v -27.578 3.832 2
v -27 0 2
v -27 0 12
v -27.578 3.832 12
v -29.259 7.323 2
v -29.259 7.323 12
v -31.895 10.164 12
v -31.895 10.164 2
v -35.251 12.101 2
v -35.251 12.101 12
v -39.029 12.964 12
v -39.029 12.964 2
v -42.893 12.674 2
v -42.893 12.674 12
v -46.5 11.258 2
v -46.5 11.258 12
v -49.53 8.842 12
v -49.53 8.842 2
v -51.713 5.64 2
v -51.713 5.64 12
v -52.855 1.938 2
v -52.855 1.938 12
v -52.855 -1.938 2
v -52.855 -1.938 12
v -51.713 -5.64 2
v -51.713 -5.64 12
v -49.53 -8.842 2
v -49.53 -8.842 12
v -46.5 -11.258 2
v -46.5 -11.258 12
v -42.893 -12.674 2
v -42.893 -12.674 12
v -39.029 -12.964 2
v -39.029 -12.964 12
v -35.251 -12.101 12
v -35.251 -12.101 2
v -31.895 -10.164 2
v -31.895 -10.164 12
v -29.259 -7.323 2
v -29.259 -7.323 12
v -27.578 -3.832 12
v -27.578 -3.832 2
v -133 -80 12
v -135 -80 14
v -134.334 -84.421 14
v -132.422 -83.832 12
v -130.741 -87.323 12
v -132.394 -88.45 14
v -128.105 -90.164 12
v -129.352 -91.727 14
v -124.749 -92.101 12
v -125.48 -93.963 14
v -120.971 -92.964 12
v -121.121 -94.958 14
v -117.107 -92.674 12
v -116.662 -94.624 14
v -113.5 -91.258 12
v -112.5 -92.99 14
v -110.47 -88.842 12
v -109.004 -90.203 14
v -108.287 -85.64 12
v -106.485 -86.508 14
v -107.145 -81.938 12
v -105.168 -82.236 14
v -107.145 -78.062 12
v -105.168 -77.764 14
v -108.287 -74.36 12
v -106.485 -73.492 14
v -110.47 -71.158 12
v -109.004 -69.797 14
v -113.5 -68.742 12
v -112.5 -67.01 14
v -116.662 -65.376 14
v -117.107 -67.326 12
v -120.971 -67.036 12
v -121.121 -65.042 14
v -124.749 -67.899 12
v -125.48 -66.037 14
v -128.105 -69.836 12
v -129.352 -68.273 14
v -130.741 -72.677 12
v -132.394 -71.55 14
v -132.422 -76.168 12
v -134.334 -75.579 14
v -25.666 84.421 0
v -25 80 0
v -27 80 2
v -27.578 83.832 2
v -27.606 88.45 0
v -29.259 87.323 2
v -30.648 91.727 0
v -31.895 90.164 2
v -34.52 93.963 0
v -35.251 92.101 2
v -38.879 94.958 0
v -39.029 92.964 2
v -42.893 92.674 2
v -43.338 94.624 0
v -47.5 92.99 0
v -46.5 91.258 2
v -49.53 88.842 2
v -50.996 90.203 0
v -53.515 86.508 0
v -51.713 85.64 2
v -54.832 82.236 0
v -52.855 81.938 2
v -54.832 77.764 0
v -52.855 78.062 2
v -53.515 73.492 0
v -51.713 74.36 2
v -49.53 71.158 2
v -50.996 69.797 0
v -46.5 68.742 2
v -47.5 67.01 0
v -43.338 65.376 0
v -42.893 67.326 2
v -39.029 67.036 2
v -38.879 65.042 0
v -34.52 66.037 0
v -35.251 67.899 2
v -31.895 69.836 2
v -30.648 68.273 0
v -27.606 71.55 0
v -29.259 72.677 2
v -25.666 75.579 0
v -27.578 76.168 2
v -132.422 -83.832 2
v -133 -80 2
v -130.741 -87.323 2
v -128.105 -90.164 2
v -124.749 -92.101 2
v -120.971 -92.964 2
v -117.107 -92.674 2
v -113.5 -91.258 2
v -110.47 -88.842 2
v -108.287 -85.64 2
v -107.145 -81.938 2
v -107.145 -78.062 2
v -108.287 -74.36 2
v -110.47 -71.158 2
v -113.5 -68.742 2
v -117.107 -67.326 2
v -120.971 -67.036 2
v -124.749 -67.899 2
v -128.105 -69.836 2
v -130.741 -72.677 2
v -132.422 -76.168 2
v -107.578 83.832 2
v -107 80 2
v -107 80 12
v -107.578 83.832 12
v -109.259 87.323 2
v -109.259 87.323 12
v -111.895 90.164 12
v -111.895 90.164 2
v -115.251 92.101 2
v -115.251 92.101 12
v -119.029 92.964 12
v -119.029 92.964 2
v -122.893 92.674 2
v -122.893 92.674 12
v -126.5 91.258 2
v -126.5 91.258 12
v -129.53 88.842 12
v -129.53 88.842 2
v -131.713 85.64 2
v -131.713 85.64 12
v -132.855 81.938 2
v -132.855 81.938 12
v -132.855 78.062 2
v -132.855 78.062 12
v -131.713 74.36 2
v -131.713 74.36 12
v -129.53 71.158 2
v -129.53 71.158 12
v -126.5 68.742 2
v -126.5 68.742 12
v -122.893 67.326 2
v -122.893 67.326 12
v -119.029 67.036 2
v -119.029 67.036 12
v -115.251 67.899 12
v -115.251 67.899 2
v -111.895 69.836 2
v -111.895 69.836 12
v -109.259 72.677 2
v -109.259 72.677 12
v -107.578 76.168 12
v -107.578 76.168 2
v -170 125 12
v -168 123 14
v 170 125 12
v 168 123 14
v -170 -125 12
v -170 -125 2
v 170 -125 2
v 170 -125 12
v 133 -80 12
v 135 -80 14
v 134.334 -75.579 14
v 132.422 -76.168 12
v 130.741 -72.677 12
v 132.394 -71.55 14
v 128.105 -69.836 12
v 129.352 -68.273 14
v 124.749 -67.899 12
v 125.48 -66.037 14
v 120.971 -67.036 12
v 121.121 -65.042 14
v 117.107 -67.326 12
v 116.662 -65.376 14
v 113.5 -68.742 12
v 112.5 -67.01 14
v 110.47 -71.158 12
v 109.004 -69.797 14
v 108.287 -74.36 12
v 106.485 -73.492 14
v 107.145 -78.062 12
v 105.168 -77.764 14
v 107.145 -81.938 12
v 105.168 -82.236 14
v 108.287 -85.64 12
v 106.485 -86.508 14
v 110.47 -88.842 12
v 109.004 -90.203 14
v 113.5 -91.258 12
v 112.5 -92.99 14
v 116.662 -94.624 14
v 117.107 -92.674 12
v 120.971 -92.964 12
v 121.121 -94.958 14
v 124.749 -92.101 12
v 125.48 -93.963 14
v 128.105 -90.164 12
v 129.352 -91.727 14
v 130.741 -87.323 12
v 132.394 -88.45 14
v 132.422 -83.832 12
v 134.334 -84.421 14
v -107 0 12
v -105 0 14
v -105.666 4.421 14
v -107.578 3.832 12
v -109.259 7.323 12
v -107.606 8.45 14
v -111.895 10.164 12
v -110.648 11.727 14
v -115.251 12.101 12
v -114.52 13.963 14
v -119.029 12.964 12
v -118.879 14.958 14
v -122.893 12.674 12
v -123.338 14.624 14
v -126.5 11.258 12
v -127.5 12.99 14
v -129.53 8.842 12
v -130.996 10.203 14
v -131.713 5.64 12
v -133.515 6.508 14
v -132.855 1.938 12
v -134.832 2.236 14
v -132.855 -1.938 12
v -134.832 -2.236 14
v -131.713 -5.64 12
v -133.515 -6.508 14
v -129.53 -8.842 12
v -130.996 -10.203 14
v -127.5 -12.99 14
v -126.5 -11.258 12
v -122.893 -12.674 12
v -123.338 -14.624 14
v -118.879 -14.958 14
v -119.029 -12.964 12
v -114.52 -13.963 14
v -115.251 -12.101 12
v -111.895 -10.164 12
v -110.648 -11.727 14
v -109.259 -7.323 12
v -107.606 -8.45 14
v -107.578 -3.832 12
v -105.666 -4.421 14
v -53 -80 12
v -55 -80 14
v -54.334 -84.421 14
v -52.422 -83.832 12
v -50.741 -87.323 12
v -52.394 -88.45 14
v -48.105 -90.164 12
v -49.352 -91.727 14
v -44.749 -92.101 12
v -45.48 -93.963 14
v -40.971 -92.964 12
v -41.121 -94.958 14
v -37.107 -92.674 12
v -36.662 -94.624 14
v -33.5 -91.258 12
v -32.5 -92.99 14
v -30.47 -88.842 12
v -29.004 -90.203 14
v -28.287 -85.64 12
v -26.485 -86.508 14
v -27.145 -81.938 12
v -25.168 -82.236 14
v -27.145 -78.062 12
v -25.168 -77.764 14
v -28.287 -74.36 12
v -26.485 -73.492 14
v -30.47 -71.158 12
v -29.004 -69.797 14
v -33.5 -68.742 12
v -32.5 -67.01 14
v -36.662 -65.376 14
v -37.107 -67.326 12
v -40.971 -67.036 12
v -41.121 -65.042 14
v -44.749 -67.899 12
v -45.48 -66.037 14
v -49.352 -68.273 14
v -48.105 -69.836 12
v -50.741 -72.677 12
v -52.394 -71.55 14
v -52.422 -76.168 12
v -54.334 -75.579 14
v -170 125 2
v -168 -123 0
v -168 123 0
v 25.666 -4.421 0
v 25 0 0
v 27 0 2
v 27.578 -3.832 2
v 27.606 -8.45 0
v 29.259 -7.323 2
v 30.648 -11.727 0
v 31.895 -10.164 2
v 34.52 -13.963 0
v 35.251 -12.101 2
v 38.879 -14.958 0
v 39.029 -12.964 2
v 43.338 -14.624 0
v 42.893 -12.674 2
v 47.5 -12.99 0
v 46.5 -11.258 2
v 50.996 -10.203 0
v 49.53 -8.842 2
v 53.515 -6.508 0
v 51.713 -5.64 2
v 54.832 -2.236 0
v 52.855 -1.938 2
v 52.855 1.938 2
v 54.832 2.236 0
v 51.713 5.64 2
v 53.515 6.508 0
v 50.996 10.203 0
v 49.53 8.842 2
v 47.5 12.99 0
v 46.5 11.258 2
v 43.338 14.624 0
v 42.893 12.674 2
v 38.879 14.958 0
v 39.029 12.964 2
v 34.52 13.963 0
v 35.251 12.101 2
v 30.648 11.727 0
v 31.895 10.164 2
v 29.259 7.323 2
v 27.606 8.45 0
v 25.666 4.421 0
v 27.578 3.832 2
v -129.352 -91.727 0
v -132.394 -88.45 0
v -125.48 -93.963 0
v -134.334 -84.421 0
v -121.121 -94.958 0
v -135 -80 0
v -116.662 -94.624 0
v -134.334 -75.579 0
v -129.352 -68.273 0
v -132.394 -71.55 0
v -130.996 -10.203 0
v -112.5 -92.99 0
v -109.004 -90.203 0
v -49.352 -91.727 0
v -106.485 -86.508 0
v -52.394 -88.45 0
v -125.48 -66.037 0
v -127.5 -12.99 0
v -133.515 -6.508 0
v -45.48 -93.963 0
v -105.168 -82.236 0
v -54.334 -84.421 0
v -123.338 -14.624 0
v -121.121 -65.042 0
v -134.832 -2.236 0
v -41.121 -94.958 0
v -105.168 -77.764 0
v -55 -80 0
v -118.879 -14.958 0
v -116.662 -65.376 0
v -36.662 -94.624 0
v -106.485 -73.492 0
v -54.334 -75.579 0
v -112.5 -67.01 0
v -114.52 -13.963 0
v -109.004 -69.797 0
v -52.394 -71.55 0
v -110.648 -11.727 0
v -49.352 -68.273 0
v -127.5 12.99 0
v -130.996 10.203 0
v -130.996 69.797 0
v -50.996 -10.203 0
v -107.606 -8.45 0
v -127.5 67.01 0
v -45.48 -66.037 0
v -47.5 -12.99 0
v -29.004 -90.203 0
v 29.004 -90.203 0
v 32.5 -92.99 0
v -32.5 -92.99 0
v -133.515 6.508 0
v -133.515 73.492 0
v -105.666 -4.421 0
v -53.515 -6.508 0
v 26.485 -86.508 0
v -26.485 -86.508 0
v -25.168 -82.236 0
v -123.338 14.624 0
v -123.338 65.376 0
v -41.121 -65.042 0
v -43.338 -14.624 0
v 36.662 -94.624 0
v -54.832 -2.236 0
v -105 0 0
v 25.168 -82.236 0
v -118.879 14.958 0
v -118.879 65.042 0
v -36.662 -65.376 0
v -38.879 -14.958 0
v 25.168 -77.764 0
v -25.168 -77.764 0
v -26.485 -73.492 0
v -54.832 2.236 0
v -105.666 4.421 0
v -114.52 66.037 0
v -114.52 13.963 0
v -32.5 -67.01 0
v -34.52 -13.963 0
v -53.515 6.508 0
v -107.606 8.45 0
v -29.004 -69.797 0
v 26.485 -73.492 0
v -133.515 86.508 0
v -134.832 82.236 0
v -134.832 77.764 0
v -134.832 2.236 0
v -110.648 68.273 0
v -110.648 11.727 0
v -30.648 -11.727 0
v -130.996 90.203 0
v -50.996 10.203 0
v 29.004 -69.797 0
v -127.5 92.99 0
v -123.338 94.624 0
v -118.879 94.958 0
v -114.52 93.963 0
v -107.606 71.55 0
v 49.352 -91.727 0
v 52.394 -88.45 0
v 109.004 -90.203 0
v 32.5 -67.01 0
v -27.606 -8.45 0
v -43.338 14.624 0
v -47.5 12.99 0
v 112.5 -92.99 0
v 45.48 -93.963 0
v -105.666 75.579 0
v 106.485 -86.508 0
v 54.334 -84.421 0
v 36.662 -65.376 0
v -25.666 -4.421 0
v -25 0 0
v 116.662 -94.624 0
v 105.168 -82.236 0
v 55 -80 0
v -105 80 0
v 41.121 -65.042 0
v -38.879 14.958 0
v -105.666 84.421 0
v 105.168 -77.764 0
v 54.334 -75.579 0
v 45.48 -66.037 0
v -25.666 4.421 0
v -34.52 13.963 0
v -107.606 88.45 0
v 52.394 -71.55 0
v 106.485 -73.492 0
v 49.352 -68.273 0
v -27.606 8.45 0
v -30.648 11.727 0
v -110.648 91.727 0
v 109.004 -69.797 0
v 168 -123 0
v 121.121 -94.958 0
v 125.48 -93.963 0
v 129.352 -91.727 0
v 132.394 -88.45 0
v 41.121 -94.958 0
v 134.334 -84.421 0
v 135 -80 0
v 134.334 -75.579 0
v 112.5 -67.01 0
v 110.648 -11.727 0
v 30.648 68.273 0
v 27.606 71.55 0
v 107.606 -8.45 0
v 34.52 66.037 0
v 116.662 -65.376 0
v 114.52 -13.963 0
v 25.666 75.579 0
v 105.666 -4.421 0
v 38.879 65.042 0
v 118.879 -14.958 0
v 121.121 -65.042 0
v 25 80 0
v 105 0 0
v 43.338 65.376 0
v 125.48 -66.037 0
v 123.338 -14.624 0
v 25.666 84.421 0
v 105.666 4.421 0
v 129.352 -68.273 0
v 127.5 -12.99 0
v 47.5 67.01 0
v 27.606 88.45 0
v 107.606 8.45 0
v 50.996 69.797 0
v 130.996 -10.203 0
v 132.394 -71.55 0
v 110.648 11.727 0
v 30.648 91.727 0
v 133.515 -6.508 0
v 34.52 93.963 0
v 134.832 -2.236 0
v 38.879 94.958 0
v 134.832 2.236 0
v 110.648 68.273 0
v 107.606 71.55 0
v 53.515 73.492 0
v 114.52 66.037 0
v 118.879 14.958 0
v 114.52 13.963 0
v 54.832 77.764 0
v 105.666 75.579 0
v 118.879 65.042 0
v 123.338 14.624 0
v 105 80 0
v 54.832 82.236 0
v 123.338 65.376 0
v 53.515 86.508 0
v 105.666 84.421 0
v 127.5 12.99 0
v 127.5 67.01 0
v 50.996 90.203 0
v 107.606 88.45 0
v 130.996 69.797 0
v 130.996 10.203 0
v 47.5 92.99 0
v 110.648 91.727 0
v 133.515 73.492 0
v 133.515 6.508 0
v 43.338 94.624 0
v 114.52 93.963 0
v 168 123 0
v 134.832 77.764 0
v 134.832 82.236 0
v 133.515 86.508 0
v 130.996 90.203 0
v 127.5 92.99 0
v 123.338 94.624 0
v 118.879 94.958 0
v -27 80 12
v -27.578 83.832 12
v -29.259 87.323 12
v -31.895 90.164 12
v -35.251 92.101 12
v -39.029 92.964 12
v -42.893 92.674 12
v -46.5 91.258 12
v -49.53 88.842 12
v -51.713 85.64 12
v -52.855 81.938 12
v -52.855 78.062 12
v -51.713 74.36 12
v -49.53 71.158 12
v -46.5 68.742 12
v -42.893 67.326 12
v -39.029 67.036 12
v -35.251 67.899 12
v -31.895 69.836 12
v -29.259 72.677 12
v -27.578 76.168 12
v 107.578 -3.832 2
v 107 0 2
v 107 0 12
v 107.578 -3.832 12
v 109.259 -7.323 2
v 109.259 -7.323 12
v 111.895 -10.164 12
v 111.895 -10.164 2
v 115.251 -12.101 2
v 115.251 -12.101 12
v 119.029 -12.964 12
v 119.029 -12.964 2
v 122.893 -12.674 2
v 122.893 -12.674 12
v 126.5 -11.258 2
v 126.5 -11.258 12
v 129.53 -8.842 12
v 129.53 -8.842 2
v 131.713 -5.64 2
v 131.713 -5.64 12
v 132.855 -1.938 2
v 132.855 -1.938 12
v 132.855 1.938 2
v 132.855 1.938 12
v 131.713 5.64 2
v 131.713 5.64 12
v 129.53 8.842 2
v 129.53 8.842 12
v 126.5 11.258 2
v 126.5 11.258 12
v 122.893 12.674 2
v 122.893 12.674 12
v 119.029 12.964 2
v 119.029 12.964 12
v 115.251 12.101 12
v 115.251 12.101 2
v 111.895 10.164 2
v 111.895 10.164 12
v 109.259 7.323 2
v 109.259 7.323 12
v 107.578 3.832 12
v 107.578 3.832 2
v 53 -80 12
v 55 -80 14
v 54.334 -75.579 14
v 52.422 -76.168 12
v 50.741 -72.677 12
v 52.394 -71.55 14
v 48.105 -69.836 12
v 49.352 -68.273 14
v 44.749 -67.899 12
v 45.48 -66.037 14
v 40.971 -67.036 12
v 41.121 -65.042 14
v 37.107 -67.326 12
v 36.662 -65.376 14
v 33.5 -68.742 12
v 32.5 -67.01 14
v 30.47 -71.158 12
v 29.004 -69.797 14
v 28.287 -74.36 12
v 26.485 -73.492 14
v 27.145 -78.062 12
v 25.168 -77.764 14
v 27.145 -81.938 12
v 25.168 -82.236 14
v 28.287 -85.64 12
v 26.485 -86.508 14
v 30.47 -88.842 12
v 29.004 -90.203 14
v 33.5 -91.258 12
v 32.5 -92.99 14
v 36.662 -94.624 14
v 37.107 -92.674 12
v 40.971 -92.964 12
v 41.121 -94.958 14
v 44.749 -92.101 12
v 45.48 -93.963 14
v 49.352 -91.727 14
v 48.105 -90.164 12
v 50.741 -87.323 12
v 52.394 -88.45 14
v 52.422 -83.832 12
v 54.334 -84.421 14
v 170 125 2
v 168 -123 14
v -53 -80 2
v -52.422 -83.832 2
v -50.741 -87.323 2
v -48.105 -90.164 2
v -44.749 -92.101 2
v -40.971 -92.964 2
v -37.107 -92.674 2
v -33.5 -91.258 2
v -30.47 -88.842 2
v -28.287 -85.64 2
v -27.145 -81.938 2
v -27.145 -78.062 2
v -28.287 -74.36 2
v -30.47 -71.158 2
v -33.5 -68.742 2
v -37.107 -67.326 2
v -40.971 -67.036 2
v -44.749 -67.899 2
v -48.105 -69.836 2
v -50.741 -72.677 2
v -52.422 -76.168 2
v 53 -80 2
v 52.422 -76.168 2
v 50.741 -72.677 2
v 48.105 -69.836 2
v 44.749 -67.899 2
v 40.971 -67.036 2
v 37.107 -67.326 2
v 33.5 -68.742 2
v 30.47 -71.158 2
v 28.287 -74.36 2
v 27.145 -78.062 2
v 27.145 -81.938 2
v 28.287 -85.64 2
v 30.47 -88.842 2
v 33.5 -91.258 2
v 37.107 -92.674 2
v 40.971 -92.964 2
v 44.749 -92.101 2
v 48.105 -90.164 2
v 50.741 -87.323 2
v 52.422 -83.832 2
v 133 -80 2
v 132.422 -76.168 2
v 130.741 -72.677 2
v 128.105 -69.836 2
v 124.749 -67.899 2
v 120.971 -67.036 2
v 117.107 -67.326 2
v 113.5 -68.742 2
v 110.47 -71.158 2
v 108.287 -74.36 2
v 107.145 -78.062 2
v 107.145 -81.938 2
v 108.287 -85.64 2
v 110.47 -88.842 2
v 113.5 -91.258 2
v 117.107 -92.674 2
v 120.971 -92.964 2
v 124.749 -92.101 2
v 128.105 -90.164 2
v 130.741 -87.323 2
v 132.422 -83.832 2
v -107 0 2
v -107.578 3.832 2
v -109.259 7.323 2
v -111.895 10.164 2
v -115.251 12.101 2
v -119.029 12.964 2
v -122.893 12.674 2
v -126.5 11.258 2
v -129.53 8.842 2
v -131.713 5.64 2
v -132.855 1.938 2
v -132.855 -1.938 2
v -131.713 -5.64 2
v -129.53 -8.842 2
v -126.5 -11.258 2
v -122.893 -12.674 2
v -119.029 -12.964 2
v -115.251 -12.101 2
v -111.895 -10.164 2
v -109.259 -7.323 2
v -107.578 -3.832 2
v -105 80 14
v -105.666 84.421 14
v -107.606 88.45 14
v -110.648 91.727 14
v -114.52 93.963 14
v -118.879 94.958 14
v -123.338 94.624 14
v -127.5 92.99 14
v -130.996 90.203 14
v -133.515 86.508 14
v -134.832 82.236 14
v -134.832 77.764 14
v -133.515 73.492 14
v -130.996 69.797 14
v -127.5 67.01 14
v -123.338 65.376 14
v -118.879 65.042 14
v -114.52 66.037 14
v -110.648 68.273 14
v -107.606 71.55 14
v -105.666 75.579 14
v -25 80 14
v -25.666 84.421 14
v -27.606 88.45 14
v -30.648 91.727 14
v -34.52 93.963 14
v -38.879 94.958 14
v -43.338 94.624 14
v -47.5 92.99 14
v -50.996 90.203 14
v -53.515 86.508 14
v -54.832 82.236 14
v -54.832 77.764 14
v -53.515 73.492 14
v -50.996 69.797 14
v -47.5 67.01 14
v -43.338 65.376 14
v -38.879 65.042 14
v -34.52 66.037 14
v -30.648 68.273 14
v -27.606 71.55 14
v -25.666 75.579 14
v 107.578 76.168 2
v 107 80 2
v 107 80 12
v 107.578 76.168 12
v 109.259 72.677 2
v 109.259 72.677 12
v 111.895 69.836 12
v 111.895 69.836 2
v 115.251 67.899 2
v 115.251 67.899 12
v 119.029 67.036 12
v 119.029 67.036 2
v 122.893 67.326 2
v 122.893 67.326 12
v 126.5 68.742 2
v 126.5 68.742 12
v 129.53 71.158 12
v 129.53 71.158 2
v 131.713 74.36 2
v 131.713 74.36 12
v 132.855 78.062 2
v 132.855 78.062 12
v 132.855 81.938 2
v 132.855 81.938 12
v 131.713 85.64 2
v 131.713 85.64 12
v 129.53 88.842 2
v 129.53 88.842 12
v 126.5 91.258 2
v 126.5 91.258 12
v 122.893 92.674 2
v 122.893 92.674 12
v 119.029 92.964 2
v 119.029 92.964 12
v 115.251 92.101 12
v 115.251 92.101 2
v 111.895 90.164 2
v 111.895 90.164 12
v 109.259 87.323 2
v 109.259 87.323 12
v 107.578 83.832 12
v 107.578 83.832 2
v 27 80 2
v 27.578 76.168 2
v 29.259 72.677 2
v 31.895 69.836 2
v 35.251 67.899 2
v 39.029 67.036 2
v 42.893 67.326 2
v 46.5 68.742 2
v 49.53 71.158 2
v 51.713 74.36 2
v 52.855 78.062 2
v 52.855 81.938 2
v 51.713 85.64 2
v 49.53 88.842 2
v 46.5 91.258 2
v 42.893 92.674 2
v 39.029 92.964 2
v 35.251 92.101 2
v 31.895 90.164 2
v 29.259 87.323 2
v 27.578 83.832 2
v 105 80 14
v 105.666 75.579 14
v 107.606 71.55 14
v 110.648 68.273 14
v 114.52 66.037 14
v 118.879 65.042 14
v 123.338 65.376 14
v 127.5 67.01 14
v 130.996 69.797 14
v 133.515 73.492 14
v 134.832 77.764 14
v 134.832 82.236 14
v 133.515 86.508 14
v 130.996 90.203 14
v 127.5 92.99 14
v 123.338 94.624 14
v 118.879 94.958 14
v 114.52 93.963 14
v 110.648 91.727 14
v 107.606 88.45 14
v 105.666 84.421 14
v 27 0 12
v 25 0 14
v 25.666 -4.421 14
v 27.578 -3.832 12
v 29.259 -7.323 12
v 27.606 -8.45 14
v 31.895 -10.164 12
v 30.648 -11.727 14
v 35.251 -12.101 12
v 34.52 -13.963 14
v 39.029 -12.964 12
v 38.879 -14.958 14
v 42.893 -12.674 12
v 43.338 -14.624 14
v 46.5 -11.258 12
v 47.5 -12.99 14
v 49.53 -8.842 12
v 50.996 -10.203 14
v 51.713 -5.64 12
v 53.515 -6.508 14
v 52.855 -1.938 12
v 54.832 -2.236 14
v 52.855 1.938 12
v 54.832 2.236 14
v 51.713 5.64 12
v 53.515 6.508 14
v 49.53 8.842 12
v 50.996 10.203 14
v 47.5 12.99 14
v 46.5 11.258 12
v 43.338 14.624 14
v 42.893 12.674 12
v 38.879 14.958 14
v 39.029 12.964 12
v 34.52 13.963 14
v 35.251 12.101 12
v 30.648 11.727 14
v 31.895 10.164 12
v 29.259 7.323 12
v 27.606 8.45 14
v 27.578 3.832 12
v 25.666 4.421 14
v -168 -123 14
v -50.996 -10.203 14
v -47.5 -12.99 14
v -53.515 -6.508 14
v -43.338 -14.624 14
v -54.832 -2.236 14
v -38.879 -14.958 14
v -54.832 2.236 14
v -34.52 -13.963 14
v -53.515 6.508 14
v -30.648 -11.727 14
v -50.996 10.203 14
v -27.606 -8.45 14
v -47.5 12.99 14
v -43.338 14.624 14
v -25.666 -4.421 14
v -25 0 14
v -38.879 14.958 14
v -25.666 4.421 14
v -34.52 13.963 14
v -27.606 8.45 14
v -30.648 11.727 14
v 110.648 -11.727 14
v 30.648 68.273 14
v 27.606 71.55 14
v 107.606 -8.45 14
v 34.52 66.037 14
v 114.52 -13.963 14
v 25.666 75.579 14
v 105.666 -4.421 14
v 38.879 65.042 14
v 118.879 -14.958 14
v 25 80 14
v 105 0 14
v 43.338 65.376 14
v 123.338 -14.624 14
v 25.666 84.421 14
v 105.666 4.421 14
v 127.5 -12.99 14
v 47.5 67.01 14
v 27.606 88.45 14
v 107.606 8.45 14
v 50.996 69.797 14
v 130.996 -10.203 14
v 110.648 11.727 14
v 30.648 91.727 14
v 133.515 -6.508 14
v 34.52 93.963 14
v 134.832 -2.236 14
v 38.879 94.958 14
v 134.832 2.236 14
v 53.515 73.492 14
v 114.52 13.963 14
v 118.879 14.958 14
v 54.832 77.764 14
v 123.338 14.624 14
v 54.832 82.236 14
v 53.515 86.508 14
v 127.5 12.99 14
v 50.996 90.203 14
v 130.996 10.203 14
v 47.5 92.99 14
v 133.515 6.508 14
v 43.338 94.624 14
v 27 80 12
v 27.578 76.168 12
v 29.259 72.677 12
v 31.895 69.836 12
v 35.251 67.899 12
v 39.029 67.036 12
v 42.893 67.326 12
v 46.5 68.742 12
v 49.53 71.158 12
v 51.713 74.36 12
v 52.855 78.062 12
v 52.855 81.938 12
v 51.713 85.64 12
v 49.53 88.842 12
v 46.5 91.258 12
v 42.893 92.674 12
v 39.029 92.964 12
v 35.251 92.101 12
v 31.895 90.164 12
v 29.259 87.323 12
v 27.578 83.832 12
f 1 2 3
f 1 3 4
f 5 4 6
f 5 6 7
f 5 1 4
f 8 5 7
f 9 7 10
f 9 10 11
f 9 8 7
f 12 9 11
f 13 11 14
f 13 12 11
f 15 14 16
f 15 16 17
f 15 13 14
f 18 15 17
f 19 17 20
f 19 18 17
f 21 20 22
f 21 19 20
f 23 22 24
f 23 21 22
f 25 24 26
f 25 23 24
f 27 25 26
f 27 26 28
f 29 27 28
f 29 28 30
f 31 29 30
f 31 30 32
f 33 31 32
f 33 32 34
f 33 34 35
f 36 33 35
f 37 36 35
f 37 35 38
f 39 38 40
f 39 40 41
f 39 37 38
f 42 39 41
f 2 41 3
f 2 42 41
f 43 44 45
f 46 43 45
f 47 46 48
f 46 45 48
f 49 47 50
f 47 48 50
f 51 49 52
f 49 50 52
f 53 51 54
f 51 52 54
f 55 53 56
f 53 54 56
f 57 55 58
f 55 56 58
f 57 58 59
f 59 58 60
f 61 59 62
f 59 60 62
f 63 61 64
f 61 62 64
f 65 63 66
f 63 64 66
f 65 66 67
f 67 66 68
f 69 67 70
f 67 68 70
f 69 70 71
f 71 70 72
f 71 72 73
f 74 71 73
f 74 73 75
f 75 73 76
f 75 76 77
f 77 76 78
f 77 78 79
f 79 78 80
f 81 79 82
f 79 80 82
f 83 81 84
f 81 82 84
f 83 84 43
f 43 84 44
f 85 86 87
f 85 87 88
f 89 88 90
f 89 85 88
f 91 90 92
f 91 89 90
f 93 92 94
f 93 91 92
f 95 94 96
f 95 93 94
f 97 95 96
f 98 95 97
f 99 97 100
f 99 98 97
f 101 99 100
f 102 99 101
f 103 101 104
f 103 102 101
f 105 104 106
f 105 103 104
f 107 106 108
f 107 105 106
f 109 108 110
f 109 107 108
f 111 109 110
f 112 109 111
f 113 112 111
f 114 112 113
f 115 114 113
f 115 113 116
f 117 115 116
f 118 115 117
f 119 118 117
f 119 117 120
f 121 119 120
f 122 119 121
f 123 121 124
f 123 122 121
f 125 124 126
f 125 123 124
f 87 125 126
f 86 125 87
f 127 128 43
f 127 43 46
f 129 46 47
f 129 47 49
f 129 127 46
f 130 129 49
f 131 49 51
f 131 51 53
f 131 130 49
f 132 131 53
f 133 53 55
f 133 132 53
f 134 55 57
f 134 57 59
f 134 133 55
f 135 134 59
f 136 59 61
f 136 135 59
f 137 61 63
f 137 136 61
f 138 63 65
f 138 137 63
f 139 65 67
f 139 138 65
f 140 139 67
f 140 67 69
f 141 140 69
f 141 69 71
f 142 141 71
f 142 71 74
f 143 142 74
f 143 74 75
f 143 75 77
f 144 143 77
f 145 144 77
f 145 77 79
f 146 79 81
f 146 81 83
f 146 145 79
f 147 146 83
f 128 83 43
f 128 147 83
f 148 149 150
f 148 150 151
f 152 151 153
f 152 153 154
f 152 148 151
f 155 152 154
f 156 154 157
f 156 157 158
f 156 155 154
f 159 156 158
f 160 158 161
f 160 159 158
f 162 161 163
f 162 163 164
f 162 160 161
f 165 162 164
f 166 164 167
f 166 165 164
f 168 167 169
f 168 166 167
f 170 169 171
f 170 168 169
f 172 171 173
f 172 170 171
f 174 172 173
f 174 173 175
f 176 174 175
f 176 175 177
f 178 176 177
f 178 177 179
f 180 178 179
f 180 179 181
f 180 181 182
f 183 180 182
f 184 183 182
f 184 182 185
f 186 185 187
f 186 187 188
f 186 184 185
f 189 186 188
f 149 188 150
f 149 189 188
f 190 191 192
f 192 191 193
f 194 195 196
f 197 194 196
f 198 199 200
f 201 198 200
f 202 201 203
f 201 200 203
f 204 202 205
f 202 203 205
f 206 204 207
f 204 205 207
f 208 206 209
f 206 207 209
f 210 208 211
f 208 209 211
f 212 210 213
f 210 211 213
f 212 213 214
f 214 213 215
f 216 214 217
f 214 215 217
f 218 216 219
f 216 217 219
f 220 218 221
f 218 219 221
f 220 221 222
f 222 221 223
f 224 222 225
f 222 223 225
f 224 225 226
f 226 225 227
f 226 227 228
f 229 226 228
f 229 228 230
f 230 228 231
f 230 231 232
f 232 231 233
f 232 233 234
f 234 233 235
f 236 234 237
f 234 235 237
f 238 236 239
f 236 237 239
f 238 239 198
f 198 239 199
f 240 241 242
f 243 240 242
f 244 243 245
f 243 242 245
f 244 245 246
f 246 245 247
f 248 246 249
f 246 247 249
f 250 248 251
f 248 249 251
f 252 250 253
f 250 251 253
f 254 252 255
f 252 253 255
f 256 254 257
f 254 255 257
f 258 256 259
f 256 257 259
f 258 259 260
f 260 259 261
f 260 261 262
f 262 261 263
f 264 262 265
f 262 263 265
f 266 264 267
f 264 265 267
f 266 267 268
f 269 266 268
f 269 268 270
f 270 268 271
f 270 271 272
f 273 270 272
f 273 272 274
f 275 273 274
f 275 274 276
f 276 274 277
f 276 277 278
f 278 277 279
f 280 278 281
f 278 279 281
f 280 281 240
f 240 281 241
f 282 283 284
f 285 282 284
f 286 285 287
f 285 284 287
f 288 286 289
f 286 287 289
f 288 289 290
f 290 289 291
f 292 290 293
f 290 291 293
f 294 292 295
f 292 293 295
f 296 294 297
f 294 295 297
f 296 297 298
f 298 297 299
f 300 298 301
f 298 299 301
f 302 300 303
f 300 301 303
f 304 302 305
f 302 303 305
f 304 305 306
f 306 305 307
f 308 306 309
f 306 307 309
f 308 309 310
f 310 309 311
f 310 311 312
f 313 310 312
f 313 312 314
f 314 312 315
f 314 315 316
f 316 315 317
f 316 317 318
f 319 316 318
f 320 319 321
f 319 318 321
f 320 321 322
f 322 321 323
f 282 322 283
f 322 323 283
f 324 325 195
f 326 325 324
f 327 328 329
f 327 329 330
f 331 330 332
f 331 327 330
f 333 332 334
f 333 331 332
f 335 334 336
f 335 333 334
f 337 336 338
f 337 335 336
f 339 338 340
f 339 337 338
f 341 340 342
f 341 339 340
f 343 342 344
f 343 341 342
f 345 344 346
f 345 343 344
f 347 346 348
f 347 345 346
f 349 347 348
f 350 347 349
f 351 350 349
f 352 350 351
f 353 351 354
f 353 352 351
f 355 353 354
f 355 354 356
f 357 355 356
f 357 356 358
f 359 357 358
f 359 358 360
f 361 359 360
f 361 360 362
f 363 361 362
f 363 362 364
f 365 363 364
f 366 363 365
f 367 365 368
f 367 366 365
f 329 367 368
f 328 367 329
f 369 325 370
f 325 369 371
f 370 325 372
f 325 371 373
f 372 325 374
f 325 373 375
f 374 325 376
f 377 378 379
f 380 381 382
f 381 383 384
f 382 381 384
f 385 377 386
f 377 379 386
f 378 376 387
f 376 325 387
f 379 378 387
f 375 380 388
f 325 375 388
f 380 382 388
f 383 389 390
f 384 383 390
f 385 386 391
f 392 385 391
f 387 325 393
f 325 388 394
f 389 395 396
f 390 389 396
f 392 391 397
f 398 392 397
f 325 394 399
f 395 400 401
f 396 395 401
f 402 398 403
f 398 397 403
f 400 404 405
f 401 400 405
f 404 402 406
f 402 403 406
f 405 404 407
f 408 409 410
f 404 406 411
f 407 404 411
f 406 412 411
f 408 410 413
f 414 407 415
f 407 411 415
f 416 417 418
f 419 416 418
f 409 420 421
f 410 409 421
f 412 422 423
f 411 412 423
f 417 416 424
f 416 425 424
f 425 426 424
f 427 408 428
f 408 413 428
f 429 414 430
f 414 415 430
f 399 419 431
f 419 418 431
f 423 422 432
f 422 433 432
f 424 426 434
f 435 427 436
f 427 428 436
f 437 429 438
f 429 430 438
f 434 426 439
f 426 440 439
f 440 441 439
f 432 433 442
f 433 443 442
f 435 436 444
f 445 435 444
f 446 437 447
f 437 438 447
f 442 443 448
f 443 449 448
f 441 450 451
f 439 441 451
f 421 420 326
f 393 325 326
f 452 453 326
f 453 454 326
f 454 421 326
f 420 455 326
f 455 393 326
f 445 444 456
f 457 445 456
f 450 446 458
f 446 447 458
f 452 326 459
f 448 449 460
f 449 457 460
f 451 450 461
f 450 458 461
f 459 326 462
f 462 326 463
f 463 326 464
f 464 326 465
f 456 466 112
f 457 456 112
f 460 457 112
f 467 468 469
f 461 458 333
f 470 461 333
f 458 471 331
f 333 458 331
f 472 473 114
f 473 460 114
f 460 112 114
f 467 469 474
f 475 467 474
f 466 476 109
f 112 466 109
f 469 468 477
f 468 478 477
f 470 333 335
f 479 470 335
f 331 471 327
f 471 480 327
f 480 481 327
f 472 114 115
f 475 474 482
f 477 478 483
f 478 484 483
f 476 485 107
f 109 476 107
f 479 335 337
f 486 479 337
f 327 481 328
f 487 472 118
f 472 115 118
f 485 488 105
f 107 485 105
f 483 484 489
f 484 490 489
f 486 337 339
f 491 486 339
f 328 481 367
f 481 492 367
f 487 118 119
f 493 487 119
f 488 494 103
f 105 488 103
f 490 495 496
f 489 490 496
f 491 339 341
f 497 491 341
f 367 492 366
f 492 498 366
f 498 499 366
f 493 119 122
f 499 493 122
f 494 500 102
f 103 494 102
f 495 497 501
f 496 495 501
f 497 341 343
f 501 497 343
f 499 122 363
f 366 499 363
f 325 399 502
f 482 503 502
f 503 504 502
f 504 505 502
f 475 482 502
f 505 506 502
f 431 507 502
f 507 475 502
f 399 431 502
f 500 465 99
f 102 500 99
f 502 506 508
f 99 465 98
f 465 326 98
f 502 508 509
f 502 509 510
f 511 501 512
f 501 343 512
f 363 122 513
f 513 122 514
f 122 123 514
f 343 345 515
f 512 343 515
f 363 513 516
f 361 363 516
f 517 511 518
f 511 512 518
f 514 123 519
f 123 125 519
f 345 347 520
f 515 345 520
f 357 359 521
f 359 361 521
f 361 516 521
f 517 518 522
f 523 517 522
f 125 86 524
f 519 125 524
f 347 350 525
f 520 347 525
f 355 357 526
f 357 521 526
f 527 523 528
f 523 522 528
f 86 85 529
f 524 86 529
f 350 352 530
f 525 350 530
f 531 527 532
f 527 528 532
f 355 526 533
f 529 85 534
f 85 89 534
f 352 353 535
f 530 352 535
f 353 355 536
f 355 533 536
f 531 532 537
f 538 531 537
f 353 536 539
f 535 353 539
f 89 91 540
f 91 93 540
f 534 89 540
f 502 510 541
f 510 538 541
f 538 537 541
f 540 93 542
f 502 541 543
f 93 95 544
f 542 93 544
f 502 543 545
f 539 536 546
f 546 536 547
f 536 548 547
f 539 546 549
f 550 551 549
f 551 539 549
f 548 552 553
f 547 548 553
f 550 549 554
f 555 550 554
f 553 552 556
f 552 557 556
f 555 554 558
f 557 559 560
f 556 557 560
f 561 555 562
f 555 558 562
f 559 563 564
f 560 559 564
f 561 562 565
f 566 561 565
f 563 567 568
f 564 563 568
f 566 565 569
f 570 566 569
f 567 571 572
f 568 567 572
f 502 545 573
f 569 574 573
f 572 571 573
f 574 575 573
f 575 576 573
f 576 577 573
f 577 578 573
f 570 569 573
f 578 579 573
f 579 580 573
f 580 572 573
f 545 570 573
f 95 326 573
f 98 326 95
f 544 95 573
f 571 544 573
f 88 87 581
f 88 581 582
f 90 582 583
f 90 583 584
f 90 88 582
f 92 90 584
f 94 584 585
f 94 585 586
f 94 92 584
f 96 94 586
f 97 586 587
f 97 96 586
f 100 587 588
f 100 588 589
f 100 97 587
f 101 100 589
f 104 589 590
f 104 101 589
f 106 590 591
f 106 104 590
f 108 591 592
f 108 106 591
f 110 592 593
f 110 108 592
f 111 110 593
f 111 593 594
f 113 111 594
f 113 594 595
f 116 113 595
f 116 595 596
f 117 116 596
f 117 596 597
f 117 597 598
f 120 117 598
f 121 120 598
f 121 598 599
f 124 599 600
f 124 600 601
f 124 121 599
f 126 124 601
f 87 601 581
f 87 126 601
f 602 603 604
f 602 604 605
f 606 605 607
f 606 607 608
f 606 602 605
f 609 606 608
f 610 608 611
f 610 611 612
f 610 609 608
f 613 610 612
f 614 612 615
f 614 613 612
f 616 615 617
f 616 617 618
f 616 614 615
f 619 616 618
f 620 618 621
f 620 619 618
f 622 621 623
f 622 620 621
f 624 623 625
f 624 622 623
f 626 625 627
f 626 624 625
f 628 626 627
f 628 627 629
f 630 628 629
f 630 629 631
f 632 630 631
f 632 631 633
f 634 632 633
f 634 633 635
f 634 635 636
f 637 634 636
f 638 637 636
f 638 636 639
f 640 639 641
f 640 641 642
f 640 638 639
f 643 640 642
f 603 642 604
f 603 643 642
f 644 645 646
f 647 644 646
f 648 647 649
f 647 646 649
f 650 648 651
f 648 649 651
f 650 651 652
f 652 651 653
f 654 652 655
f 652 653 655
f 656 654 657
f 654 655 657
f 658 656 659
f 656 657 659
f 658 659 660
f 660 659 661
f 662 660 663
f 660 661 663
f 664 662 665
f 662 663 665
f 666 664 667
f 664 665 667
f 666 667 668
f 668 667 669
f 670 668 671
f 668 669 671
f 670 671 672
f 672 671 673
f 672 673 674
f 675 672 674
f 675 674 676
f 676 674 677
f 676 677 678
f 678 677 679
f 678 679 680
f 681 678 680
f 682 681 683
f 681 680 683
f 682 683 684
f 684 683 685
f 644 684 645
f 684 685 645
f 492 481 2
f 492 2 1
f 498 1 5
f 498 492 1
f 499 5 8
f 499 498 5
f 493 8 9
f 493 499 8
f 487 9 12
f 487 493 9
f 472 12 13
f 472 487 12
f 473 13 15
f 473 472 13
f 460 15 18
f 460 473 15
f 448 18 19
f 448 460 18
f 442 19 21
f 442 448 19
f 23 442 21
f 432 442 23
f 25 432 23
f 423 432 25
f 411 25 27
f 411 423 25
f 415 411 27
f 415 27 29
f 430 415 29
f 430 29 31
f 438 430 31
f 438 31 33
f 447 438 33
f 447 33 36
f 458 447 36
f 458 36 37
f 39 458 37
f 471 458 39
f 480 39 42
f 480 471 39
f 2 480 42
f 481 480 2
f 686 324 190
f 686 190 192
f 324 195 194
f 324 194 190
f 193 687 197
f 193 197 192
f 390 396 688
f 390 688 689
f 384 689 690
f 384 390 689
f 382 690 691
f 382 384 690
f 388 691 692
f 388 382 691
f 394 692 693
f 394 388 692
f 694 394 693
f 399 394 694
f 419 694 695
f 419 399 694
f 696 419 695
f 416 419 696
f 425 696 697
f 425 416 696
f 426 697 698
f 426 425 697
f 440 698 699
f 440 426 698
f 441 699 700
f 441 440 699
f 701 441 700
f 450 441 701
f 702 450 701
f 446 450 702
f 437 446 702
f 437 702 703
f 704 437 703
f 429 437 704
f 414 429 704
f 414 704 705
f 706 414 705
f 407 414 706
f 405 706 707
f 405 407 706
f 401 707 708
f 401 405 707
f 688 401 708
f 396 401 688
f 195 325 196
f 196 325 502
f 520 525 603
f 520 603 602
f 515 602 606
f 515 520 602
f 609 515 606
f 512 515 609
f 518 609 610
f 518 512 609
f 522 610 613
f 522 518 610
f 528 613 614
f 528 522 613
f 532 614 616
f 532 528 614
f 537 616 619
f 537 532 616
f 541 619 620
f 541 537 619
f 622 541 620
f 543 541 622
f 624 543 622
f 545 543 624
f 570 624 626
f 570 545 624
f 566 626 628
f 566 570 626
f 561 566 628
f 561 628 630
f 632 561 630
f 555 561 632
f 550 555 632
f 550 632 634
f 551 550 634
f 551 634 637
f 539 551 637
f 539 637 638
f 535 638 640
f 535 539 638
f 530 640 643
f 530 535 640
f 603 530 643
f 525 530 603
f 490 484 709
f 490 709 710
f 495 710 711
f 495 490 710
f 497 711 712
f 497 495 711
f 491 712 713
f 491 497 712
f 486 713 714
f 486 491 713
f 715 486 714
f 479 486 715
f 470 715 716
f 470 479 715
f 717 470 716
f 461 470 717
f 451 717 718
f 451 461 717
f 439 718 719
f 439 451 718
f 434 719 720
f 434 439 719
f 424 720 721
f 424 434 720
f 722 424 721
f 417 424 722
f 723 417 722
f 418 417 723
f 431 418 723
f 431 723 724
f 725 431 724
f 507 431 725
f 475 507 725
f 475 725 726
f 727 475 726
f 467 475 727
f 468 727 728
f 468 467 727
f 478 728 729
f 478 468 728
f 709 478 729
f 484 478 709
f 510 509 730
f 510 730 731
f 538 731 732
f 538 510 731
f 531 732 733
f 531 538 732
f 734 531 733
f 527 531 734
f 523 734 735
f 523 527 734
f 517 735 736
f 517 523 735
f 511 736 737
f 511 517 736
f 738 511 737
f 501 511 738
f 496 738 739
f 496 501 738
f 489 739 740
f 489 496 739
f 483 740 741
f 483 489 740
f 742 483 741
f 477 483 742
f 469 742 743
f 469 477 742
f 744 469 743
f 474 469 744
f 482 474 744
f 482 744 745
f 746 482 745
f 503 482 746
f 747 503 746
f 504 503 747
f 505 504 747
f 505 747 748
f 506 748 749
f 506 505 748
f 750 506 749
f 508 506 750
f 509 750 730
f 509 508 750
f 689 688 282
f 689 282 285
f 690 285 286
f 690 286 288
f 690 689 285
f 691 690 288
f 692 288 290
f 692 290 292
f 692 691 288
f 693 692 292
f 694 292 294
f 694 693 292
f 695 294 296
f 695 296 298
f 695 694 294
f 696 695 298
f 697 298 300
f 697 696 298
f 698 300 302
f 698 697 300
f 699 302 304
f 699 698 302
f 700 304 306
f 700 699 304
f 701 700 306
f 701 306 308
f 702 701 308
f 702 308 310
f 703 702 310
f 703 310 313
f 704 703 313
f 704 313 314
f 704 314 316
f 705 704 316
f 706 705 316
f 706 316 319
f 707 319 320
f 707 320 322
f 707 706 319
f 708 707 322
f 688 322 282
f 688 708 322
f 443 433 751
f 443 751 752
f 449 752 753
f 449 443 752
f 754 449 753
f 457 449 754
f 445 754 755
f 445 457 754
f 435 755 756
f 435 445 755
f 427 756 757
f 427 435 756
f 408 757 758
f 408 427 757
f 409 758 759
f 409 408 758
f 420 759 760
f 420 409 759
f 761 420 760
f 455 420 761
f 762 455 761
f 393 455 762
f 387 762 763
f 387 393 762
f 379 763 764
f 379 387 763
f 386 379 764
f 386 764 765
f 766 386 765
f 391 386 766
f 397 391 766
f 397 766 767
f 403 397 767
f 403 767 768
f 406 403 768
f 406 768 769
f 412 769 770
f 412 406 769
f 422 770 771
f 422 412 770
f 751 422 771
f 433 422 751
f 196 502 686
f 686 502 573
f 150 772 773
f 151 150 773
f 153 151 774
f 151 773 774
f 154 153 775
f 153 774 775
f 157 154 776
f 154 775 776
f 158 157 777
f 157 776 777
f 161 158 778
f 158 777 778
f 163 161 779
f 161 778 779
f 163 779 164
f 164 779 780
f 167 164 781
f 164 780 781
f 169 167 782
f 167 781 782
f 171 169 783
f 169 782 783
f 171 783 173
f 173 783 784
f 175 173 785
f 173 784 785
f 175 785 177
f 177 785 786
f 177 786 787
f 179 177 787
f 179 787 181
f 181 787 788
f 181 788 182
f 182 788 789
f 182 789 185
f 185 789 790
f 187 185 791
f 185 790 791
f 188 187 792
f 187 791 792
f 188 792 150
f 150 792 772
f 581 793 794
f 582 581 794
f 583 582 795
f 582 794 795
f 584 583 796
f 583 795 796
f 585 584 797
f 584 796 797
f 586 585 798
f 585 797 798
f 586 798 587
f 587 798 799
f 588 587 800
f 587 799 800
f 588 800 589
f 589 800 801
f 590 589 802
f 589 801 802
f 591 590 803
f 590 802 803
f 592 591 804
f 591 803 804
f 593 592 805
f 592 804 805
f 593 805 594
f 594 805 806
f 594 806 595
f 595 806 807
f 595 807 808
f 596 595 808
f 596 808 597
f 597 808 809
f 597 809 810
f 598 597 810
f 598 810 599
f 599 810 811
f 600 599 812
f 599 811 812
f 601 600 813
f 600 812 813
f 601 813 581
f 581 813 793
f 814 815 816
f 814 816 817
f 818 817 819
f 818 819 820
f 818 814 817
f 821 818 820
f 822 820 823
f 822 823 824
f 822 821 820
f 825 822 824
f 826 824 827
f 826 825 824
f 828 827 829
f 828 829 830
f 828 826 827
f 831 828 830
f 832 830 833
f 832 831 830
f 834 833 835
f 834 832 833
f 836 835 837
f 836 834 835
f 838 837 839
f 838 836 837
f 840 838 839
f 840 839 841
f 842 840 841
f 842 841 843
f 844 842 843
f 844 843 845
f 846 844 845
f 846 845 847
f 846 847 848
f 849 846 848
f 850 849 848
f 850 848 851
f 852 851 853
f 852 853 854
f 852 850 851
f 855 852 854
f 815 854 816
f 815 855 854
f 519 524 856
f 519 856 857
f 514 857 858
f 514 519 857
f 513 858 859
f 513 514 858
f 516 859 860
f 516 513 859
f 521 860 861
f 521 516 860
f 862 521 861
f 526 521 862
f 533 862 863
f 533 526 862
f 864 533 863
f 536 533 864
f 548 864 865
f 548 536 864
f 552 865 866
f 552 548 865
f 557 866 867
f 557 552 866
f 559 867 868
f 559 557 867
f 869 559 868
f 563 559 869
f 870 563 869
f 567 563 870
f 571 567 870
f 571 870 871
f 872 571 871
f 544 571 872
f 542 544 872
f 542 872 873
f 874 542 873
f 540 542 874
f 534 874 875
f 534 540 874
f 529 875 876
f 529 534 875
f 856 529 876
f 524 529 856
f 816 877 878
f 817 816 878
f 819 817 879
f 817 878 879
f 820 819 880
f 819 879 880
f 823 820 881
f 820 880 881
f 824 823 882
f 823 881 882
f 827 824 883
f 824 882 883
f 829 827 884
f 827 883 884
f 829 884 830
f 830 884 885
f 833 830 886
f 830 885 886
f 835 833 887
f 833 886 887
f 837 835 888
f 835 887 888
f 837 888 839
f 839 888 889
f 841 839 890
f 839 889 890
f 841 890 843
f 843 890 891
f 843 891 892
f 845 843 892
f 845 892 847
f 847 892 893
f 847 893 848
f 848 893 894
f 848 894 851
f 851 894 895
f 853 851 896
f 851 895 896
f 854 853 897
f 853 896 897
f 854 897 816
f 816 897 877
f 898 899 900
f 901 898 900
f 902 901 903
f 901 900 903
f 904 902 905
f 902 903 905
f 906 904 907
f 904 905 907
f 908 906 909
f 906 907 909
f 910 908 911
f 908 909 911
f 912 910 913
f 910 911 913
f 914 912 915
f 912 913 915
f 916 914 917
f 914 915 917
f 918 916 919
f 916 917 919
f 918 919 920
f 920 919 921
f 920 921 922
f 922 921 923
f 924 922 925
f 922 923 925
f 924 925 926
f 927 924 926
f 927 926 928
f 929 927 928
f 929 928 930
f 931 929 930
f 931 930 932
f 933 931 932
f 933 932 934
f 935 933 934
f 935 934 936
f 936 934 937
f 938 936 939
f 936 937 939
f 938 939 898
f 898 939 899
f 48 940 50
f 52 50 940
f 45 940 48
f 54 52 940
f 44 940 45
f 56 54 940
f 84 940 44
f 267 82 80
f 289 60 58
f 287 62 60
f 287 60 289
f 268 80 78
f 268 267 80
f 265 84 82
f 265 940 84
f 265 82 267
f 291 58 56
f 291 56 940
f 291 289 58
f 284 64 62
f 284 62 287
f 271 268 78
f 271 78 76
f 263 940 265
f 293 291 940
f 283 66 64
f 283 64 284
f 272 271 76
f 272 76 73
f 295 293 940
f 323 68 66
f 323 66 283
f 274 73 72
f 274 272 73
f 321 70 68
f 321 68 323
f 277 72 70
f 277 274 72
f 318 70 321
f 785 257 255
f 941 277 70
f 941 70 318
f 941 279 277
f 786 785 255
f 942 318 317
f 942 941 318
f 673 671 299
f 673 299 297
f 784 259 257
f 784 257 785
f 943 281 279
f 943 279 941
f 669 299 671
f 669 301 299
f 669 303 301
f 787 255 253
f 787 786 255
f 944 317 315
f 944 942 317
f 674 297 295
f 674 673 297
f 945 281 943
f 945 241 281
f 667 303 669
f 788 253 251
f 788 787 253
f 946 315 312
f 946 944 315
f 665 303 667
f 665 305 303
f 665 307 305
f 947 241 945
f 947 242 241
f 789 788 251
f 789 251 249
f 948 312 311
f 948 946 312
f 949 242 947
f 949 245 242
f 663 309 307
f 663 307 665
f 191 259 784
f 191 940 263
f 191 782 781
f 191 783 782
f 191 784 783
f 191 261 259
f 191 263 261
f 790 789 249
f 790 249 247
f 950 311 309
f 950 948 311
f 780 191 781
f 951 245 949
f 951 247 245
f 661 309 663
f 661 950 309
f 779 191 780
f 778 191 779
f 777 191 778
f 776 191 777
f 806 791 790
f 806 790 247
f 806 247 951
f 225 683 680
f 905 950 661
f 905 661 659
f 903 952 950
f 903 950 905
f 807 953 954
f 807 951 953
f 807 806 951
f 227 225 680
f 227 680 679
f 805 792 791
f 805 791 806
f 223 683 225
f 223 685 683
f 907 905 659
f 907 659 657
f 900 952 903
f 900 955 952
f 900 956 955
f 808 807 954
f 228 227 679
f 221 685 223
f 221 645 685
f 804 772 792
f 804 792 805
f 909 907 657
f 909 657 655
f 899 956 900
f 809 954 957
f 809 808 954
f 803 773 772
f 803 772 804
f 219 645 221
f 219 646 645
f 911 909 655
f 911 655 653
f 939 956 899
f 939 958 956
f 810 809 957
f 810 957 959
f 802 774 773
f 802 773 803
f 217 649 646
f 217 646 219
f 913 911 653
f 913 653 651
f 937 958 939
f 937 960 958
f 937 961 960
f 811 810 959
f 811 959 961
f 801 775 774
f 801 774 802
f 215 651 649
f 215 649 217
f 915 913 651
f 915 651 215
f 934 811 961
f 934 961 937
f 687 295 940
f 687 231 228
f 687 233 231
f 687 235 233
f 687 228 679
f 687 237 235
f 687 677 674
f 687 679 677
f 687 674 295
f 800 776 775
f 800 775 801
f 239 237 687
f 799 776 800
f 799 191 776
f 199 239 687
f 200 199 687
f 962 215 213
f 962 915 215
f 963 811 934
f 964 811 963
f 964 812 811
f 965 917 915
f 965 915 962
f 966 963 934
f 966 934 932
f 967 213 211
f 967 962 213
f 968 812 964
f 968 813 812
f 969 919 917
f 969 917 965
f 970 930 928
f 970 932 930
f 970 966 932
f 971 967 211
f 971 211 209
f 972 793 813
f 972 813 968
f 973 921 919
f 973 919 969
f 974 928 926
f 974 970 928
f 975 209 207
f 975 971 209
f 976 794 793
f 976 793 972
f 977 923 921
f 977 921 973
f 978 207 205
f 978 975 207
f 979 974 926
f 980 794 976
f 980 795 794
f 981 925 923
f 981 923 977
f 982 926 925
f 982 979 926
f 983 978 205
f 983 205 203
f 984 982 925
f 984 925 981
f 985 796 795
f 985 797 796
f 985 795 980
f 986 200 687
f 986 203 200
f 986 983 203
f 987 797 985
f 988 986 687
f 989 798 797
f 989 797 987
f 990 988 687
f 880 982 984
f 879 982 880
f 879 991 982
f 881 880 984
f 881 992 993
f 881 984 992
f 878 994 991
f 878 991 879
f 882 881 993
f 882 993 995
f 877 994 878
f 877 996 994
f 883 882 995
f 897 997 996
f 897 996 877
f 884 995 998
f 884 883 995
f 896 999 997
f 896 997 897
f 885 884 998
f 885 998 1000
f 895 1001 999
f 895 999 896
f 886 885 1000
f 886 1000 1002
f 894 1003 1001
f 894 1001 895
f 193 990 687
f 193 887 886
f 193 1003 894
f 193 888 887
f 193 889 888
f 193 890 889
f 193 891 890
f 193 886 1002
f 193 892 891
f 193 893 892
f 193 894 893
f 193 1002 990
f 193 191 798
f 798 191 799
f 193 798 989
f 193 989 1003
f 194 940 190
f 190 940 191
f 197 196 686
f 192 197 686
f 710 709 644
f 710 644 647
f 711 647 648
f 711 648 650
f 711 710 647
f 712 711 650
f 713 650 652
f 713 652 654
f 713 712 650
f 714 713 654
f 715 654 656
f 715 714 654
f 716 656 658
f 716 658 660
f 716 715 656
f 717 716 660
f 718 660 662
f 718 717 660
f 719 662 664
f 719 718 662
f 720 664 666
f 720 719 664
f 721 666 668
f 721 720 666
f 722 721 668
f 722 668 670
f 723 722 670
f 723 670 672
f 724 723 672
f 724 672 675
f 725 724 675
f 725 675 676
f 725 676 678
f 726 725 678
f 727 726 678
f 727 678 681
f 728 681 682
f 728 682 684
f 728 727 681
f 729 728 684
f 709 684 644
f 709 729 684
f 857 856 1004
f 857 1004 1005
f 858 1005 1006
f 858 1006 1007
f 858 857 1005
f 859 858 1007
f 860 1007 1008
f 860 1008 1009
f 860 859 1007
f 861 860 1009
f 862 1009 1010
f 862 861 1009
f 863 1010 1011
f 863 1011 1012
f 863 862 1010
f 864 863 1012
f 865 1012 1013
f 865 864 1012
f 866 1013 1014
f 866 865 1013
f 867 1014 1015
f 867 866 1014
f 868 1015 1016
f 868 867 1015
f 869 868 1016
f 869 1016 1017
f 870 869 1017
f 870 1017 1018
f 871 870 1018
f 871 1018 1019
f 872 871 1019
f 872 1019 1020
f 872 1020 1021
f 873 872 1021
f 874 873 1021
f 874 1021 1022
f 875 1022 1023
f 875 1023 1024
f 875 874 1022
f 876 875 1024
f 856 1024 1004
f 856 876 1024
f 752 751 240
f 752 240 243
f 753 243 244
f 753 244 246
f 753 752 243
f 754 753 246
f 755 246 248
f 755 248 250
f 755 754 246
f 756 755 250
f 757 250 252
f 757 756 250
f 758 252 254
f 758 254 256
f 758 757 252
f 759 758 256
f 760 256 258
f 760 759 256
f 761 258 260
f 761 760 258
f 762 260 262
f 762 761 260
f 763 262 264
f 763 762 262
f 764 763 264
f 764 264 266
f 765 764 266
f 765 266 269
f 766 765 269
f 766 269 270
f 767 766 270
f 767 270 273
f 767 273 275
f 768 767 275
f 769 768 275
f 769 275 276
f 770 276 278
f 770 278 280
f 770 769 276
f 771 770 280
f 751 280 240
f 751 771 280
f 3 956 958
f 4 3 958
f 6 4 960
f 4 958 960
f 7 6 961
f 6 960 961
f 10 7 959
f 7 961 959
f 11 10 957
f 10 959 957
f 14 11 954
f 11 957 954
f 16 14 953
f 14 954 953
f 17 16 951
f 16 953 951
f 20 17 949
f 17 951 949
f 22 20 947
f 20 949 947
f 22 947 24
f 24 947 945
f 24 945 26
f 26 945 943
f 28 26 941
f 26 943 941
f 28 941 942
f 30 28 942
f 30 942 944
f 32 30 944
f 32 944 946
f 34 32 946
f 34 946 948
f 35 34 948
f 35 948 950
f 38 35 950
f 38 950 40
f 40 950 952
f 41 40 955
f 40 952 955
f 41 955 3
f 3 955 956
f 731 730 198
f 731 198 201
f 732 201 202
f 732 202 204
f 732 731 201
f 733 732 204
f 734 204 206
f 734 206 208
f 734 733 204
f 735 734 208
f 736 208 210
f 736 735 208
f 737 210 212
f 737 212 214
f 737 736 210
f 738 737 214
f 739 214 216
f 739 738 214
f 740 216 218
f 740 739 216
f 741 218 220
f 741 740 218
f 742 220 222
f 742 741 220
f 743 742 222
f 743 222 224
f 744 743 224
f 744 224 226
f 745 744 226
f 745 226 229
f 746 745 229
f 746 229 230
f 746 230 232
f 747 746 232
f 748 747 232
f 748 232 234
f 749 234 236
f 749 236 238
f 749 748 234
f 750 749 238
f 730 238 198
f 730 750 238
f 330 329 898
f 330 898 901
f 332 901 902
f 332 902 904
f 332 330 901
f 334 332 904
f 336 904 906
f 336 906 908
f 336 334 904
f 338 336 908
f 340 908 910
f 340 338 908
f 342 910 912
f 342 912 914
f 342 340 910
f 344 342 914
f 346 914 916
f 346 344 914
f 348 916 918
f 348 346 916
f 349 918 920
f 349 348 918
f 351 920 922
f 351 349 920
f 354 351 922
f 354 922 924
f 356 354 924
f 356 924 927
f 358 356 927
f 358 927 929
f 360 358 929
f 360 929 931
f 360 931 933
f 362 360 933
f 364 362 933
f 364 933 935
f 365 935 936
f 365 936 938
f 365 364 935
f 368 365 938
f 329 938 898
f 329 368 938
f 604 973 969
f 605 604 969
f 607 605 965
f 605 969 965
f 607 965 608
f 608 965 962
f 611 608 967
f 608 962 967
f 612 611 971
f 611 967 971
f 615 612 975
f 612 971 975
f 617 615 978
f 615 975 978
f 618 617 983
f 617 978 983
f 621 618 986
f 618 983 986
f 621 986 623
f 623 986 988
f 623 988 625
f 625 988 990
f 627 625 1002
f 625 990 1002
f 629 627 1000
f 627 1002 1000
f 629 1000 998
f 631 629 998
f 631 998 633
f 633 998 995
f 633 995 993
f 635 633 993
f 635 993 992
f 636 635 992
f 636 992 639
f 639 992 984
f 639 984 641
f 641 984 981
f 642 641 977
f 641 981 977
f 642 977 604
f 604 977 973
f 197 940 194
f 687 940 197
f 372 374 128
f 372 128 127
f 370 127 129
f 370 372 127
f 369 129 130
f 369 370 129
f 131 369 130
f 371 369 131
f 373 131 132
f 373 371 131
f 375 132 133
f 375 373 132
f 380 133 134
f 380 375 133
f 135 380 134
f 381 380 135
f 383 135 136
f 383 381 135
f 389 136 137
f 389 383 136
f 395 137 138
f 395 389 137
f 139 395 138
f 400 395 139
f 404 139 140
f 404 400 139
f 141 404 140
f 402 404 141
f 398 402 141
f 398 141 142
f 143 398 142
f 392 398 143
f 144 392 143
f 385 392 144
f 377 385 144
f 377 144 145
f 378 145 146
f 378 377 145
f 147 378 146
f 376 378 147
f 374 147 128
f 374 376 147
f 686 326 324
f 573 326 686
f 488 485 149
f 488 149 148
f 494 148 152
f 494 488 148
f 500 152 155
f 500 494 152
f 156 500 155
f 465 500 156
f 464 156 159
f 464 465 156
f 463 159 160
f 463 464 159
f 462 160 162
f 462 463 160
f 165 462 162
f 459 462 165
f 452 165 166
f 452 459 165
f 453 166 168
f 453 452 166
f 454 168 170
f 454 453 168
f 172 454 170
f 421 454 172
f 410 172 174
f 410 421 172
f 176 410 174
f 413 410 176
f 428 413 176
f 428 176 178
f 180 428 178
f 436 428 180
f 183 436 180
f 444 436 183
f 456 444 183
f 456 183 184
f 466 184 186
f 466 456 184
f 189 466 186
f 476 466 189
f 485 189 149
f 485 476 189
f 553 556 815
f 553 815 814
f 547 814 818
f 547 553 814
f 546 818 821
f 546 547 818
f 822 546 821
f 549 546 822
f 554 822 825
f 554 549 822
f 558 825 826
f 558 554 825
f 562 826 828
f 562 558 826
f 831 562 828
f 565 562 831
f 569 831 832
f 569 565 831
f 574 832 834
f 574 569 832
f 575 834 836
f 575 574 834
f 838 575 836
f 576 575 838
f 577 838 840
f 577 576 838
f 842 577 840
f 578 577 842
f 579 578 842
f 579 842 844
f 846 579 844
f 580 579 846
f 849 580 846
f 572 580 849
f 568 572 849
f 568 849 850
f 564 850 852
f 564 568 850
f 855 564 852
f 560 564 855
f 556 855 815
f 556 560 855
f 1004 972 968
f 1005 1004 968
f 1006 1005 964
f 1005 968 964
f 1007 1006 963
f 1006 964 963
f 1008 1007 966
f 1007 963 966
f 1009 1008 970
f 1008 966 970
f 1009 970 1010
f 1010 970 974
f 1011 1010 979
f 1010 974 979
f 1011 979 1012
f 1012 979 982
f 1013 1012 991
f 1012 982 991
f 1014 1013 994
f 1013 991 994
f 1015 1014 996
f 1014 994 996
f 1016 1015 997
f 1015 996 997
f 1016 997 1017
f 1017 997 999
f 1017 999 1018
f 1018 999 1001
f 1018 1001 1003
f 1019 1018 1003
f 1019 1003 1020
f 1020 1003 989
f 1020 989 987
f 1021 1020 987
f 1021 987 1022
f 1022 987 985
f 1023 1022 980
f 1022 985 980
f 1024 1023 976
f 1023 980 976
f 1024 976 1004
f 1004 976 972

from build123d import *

# Parameters (mm, degrees)
SKETCH_1_W        = 340
SKETCH_1_H        = 250
SKETCH_1_R        = 13
EXTRUDE_406_DEPTH = 14
CHAMFER_1_SIZE    = 2


with BuildPart() as part:
    # 草图1 → Extrude 406 (new body)
    with BuildSketch(Plane.XY):
        Rectangle(SKETCH_1_W, SKETCH_1_H)
        with Locations((-120, 80)):
            Circle(SKETCH_1_R, mode=Mode.SUBTRACT)
        with Locations((-40, 80)):
            Circle(SKETCH_1_R, mode=Mode.SUBTRACT)
        with Locations((-40, 0)):
            Circle(SKETCH_1_R, mode=Mode.SUBTRACT)
        with Locations((-120, 0)):
            Circle(SKETCH_1_R, mode=Mode.SUBTRACT)
        with Locations(Location((-40, -80, 0), (0, 0, 180))):
            Circle(SKETCH_1_R, mode=Mode.SUBTRACT)
        with Locations(Location((-120, -80, 0), (0, 0, 180))):
            Circle(SKETCH_1_R, mode=Mode.SUBTRACT)
        with Locations((120, -80)):
            Circle(SKETCH_1_R, mode=Mode.SUBTRACT)
        with Locations((40, -80)):
            Circle(SKETCH_1_R, mode=Mode.SUBTRACT)
        with Locations(Location((120, 0, 0), (0, 0, 180))):
            Circle(SKETCH_1_R, mode=Mode.SUBTRACT)
        with Locations(Location((40, 0, 0), (0, 0, 180))):
            Circle(SKETCH_1_R, mode=Mode.SUBTRACT)
        with Locations(Location((40, 80, 0), (0, 0, 180))):
            Circle(SKETCH_1_R, mode=Mode.SUBTRACT)
        with Locations(Location((120, 80, 0), (0, 0, 180))):
            Circle(SKETCH_1_R, mode=Mode.SUBTRACT)
    extrude(amount=EXTRUDE_406_DEPTH)

    # 倒角1
    chamfer_1_edges = [part.edges().sort_by_distance(p)[0] for p in [
        (170, 0, 14),
        (-133, 80, 0),
        (-133, 80, 14),
        (0, 125, 14),
        (-53, 80, 0),
        (-53, 80, 14),
        (-53, 0, 0),
        (-53, 0, 14),
        (-133, 0, 0),
        (-133, 0, 14),
        (-27, -80, 0),
        (-27, -80, 14),
        (-107, -80, 0),
        (-107, -80, 14),
        (107, -80, 0),
        (107, -80, 14),
        (27, -80, 0),
        (27, -80, 14),
        (-170, 0, 14),
        (133, 0, 0),
        (133, 0, 14),
        (0, 125, 0),
        (53, 0, 0),
        (53, 0, 14),
        (170, 0, 0),
        (53, 80, 0),
        (53, 80, 14),
        (0, -125, 0),
        (133, 80, 0),
        (133, 80, 14),
        (-170, 0, 0),
        (0, -125, 14),
    ]]
    chamfer(chamfer_1_edges, length=CHAMFER_1_SIZE)


solid = part.part
